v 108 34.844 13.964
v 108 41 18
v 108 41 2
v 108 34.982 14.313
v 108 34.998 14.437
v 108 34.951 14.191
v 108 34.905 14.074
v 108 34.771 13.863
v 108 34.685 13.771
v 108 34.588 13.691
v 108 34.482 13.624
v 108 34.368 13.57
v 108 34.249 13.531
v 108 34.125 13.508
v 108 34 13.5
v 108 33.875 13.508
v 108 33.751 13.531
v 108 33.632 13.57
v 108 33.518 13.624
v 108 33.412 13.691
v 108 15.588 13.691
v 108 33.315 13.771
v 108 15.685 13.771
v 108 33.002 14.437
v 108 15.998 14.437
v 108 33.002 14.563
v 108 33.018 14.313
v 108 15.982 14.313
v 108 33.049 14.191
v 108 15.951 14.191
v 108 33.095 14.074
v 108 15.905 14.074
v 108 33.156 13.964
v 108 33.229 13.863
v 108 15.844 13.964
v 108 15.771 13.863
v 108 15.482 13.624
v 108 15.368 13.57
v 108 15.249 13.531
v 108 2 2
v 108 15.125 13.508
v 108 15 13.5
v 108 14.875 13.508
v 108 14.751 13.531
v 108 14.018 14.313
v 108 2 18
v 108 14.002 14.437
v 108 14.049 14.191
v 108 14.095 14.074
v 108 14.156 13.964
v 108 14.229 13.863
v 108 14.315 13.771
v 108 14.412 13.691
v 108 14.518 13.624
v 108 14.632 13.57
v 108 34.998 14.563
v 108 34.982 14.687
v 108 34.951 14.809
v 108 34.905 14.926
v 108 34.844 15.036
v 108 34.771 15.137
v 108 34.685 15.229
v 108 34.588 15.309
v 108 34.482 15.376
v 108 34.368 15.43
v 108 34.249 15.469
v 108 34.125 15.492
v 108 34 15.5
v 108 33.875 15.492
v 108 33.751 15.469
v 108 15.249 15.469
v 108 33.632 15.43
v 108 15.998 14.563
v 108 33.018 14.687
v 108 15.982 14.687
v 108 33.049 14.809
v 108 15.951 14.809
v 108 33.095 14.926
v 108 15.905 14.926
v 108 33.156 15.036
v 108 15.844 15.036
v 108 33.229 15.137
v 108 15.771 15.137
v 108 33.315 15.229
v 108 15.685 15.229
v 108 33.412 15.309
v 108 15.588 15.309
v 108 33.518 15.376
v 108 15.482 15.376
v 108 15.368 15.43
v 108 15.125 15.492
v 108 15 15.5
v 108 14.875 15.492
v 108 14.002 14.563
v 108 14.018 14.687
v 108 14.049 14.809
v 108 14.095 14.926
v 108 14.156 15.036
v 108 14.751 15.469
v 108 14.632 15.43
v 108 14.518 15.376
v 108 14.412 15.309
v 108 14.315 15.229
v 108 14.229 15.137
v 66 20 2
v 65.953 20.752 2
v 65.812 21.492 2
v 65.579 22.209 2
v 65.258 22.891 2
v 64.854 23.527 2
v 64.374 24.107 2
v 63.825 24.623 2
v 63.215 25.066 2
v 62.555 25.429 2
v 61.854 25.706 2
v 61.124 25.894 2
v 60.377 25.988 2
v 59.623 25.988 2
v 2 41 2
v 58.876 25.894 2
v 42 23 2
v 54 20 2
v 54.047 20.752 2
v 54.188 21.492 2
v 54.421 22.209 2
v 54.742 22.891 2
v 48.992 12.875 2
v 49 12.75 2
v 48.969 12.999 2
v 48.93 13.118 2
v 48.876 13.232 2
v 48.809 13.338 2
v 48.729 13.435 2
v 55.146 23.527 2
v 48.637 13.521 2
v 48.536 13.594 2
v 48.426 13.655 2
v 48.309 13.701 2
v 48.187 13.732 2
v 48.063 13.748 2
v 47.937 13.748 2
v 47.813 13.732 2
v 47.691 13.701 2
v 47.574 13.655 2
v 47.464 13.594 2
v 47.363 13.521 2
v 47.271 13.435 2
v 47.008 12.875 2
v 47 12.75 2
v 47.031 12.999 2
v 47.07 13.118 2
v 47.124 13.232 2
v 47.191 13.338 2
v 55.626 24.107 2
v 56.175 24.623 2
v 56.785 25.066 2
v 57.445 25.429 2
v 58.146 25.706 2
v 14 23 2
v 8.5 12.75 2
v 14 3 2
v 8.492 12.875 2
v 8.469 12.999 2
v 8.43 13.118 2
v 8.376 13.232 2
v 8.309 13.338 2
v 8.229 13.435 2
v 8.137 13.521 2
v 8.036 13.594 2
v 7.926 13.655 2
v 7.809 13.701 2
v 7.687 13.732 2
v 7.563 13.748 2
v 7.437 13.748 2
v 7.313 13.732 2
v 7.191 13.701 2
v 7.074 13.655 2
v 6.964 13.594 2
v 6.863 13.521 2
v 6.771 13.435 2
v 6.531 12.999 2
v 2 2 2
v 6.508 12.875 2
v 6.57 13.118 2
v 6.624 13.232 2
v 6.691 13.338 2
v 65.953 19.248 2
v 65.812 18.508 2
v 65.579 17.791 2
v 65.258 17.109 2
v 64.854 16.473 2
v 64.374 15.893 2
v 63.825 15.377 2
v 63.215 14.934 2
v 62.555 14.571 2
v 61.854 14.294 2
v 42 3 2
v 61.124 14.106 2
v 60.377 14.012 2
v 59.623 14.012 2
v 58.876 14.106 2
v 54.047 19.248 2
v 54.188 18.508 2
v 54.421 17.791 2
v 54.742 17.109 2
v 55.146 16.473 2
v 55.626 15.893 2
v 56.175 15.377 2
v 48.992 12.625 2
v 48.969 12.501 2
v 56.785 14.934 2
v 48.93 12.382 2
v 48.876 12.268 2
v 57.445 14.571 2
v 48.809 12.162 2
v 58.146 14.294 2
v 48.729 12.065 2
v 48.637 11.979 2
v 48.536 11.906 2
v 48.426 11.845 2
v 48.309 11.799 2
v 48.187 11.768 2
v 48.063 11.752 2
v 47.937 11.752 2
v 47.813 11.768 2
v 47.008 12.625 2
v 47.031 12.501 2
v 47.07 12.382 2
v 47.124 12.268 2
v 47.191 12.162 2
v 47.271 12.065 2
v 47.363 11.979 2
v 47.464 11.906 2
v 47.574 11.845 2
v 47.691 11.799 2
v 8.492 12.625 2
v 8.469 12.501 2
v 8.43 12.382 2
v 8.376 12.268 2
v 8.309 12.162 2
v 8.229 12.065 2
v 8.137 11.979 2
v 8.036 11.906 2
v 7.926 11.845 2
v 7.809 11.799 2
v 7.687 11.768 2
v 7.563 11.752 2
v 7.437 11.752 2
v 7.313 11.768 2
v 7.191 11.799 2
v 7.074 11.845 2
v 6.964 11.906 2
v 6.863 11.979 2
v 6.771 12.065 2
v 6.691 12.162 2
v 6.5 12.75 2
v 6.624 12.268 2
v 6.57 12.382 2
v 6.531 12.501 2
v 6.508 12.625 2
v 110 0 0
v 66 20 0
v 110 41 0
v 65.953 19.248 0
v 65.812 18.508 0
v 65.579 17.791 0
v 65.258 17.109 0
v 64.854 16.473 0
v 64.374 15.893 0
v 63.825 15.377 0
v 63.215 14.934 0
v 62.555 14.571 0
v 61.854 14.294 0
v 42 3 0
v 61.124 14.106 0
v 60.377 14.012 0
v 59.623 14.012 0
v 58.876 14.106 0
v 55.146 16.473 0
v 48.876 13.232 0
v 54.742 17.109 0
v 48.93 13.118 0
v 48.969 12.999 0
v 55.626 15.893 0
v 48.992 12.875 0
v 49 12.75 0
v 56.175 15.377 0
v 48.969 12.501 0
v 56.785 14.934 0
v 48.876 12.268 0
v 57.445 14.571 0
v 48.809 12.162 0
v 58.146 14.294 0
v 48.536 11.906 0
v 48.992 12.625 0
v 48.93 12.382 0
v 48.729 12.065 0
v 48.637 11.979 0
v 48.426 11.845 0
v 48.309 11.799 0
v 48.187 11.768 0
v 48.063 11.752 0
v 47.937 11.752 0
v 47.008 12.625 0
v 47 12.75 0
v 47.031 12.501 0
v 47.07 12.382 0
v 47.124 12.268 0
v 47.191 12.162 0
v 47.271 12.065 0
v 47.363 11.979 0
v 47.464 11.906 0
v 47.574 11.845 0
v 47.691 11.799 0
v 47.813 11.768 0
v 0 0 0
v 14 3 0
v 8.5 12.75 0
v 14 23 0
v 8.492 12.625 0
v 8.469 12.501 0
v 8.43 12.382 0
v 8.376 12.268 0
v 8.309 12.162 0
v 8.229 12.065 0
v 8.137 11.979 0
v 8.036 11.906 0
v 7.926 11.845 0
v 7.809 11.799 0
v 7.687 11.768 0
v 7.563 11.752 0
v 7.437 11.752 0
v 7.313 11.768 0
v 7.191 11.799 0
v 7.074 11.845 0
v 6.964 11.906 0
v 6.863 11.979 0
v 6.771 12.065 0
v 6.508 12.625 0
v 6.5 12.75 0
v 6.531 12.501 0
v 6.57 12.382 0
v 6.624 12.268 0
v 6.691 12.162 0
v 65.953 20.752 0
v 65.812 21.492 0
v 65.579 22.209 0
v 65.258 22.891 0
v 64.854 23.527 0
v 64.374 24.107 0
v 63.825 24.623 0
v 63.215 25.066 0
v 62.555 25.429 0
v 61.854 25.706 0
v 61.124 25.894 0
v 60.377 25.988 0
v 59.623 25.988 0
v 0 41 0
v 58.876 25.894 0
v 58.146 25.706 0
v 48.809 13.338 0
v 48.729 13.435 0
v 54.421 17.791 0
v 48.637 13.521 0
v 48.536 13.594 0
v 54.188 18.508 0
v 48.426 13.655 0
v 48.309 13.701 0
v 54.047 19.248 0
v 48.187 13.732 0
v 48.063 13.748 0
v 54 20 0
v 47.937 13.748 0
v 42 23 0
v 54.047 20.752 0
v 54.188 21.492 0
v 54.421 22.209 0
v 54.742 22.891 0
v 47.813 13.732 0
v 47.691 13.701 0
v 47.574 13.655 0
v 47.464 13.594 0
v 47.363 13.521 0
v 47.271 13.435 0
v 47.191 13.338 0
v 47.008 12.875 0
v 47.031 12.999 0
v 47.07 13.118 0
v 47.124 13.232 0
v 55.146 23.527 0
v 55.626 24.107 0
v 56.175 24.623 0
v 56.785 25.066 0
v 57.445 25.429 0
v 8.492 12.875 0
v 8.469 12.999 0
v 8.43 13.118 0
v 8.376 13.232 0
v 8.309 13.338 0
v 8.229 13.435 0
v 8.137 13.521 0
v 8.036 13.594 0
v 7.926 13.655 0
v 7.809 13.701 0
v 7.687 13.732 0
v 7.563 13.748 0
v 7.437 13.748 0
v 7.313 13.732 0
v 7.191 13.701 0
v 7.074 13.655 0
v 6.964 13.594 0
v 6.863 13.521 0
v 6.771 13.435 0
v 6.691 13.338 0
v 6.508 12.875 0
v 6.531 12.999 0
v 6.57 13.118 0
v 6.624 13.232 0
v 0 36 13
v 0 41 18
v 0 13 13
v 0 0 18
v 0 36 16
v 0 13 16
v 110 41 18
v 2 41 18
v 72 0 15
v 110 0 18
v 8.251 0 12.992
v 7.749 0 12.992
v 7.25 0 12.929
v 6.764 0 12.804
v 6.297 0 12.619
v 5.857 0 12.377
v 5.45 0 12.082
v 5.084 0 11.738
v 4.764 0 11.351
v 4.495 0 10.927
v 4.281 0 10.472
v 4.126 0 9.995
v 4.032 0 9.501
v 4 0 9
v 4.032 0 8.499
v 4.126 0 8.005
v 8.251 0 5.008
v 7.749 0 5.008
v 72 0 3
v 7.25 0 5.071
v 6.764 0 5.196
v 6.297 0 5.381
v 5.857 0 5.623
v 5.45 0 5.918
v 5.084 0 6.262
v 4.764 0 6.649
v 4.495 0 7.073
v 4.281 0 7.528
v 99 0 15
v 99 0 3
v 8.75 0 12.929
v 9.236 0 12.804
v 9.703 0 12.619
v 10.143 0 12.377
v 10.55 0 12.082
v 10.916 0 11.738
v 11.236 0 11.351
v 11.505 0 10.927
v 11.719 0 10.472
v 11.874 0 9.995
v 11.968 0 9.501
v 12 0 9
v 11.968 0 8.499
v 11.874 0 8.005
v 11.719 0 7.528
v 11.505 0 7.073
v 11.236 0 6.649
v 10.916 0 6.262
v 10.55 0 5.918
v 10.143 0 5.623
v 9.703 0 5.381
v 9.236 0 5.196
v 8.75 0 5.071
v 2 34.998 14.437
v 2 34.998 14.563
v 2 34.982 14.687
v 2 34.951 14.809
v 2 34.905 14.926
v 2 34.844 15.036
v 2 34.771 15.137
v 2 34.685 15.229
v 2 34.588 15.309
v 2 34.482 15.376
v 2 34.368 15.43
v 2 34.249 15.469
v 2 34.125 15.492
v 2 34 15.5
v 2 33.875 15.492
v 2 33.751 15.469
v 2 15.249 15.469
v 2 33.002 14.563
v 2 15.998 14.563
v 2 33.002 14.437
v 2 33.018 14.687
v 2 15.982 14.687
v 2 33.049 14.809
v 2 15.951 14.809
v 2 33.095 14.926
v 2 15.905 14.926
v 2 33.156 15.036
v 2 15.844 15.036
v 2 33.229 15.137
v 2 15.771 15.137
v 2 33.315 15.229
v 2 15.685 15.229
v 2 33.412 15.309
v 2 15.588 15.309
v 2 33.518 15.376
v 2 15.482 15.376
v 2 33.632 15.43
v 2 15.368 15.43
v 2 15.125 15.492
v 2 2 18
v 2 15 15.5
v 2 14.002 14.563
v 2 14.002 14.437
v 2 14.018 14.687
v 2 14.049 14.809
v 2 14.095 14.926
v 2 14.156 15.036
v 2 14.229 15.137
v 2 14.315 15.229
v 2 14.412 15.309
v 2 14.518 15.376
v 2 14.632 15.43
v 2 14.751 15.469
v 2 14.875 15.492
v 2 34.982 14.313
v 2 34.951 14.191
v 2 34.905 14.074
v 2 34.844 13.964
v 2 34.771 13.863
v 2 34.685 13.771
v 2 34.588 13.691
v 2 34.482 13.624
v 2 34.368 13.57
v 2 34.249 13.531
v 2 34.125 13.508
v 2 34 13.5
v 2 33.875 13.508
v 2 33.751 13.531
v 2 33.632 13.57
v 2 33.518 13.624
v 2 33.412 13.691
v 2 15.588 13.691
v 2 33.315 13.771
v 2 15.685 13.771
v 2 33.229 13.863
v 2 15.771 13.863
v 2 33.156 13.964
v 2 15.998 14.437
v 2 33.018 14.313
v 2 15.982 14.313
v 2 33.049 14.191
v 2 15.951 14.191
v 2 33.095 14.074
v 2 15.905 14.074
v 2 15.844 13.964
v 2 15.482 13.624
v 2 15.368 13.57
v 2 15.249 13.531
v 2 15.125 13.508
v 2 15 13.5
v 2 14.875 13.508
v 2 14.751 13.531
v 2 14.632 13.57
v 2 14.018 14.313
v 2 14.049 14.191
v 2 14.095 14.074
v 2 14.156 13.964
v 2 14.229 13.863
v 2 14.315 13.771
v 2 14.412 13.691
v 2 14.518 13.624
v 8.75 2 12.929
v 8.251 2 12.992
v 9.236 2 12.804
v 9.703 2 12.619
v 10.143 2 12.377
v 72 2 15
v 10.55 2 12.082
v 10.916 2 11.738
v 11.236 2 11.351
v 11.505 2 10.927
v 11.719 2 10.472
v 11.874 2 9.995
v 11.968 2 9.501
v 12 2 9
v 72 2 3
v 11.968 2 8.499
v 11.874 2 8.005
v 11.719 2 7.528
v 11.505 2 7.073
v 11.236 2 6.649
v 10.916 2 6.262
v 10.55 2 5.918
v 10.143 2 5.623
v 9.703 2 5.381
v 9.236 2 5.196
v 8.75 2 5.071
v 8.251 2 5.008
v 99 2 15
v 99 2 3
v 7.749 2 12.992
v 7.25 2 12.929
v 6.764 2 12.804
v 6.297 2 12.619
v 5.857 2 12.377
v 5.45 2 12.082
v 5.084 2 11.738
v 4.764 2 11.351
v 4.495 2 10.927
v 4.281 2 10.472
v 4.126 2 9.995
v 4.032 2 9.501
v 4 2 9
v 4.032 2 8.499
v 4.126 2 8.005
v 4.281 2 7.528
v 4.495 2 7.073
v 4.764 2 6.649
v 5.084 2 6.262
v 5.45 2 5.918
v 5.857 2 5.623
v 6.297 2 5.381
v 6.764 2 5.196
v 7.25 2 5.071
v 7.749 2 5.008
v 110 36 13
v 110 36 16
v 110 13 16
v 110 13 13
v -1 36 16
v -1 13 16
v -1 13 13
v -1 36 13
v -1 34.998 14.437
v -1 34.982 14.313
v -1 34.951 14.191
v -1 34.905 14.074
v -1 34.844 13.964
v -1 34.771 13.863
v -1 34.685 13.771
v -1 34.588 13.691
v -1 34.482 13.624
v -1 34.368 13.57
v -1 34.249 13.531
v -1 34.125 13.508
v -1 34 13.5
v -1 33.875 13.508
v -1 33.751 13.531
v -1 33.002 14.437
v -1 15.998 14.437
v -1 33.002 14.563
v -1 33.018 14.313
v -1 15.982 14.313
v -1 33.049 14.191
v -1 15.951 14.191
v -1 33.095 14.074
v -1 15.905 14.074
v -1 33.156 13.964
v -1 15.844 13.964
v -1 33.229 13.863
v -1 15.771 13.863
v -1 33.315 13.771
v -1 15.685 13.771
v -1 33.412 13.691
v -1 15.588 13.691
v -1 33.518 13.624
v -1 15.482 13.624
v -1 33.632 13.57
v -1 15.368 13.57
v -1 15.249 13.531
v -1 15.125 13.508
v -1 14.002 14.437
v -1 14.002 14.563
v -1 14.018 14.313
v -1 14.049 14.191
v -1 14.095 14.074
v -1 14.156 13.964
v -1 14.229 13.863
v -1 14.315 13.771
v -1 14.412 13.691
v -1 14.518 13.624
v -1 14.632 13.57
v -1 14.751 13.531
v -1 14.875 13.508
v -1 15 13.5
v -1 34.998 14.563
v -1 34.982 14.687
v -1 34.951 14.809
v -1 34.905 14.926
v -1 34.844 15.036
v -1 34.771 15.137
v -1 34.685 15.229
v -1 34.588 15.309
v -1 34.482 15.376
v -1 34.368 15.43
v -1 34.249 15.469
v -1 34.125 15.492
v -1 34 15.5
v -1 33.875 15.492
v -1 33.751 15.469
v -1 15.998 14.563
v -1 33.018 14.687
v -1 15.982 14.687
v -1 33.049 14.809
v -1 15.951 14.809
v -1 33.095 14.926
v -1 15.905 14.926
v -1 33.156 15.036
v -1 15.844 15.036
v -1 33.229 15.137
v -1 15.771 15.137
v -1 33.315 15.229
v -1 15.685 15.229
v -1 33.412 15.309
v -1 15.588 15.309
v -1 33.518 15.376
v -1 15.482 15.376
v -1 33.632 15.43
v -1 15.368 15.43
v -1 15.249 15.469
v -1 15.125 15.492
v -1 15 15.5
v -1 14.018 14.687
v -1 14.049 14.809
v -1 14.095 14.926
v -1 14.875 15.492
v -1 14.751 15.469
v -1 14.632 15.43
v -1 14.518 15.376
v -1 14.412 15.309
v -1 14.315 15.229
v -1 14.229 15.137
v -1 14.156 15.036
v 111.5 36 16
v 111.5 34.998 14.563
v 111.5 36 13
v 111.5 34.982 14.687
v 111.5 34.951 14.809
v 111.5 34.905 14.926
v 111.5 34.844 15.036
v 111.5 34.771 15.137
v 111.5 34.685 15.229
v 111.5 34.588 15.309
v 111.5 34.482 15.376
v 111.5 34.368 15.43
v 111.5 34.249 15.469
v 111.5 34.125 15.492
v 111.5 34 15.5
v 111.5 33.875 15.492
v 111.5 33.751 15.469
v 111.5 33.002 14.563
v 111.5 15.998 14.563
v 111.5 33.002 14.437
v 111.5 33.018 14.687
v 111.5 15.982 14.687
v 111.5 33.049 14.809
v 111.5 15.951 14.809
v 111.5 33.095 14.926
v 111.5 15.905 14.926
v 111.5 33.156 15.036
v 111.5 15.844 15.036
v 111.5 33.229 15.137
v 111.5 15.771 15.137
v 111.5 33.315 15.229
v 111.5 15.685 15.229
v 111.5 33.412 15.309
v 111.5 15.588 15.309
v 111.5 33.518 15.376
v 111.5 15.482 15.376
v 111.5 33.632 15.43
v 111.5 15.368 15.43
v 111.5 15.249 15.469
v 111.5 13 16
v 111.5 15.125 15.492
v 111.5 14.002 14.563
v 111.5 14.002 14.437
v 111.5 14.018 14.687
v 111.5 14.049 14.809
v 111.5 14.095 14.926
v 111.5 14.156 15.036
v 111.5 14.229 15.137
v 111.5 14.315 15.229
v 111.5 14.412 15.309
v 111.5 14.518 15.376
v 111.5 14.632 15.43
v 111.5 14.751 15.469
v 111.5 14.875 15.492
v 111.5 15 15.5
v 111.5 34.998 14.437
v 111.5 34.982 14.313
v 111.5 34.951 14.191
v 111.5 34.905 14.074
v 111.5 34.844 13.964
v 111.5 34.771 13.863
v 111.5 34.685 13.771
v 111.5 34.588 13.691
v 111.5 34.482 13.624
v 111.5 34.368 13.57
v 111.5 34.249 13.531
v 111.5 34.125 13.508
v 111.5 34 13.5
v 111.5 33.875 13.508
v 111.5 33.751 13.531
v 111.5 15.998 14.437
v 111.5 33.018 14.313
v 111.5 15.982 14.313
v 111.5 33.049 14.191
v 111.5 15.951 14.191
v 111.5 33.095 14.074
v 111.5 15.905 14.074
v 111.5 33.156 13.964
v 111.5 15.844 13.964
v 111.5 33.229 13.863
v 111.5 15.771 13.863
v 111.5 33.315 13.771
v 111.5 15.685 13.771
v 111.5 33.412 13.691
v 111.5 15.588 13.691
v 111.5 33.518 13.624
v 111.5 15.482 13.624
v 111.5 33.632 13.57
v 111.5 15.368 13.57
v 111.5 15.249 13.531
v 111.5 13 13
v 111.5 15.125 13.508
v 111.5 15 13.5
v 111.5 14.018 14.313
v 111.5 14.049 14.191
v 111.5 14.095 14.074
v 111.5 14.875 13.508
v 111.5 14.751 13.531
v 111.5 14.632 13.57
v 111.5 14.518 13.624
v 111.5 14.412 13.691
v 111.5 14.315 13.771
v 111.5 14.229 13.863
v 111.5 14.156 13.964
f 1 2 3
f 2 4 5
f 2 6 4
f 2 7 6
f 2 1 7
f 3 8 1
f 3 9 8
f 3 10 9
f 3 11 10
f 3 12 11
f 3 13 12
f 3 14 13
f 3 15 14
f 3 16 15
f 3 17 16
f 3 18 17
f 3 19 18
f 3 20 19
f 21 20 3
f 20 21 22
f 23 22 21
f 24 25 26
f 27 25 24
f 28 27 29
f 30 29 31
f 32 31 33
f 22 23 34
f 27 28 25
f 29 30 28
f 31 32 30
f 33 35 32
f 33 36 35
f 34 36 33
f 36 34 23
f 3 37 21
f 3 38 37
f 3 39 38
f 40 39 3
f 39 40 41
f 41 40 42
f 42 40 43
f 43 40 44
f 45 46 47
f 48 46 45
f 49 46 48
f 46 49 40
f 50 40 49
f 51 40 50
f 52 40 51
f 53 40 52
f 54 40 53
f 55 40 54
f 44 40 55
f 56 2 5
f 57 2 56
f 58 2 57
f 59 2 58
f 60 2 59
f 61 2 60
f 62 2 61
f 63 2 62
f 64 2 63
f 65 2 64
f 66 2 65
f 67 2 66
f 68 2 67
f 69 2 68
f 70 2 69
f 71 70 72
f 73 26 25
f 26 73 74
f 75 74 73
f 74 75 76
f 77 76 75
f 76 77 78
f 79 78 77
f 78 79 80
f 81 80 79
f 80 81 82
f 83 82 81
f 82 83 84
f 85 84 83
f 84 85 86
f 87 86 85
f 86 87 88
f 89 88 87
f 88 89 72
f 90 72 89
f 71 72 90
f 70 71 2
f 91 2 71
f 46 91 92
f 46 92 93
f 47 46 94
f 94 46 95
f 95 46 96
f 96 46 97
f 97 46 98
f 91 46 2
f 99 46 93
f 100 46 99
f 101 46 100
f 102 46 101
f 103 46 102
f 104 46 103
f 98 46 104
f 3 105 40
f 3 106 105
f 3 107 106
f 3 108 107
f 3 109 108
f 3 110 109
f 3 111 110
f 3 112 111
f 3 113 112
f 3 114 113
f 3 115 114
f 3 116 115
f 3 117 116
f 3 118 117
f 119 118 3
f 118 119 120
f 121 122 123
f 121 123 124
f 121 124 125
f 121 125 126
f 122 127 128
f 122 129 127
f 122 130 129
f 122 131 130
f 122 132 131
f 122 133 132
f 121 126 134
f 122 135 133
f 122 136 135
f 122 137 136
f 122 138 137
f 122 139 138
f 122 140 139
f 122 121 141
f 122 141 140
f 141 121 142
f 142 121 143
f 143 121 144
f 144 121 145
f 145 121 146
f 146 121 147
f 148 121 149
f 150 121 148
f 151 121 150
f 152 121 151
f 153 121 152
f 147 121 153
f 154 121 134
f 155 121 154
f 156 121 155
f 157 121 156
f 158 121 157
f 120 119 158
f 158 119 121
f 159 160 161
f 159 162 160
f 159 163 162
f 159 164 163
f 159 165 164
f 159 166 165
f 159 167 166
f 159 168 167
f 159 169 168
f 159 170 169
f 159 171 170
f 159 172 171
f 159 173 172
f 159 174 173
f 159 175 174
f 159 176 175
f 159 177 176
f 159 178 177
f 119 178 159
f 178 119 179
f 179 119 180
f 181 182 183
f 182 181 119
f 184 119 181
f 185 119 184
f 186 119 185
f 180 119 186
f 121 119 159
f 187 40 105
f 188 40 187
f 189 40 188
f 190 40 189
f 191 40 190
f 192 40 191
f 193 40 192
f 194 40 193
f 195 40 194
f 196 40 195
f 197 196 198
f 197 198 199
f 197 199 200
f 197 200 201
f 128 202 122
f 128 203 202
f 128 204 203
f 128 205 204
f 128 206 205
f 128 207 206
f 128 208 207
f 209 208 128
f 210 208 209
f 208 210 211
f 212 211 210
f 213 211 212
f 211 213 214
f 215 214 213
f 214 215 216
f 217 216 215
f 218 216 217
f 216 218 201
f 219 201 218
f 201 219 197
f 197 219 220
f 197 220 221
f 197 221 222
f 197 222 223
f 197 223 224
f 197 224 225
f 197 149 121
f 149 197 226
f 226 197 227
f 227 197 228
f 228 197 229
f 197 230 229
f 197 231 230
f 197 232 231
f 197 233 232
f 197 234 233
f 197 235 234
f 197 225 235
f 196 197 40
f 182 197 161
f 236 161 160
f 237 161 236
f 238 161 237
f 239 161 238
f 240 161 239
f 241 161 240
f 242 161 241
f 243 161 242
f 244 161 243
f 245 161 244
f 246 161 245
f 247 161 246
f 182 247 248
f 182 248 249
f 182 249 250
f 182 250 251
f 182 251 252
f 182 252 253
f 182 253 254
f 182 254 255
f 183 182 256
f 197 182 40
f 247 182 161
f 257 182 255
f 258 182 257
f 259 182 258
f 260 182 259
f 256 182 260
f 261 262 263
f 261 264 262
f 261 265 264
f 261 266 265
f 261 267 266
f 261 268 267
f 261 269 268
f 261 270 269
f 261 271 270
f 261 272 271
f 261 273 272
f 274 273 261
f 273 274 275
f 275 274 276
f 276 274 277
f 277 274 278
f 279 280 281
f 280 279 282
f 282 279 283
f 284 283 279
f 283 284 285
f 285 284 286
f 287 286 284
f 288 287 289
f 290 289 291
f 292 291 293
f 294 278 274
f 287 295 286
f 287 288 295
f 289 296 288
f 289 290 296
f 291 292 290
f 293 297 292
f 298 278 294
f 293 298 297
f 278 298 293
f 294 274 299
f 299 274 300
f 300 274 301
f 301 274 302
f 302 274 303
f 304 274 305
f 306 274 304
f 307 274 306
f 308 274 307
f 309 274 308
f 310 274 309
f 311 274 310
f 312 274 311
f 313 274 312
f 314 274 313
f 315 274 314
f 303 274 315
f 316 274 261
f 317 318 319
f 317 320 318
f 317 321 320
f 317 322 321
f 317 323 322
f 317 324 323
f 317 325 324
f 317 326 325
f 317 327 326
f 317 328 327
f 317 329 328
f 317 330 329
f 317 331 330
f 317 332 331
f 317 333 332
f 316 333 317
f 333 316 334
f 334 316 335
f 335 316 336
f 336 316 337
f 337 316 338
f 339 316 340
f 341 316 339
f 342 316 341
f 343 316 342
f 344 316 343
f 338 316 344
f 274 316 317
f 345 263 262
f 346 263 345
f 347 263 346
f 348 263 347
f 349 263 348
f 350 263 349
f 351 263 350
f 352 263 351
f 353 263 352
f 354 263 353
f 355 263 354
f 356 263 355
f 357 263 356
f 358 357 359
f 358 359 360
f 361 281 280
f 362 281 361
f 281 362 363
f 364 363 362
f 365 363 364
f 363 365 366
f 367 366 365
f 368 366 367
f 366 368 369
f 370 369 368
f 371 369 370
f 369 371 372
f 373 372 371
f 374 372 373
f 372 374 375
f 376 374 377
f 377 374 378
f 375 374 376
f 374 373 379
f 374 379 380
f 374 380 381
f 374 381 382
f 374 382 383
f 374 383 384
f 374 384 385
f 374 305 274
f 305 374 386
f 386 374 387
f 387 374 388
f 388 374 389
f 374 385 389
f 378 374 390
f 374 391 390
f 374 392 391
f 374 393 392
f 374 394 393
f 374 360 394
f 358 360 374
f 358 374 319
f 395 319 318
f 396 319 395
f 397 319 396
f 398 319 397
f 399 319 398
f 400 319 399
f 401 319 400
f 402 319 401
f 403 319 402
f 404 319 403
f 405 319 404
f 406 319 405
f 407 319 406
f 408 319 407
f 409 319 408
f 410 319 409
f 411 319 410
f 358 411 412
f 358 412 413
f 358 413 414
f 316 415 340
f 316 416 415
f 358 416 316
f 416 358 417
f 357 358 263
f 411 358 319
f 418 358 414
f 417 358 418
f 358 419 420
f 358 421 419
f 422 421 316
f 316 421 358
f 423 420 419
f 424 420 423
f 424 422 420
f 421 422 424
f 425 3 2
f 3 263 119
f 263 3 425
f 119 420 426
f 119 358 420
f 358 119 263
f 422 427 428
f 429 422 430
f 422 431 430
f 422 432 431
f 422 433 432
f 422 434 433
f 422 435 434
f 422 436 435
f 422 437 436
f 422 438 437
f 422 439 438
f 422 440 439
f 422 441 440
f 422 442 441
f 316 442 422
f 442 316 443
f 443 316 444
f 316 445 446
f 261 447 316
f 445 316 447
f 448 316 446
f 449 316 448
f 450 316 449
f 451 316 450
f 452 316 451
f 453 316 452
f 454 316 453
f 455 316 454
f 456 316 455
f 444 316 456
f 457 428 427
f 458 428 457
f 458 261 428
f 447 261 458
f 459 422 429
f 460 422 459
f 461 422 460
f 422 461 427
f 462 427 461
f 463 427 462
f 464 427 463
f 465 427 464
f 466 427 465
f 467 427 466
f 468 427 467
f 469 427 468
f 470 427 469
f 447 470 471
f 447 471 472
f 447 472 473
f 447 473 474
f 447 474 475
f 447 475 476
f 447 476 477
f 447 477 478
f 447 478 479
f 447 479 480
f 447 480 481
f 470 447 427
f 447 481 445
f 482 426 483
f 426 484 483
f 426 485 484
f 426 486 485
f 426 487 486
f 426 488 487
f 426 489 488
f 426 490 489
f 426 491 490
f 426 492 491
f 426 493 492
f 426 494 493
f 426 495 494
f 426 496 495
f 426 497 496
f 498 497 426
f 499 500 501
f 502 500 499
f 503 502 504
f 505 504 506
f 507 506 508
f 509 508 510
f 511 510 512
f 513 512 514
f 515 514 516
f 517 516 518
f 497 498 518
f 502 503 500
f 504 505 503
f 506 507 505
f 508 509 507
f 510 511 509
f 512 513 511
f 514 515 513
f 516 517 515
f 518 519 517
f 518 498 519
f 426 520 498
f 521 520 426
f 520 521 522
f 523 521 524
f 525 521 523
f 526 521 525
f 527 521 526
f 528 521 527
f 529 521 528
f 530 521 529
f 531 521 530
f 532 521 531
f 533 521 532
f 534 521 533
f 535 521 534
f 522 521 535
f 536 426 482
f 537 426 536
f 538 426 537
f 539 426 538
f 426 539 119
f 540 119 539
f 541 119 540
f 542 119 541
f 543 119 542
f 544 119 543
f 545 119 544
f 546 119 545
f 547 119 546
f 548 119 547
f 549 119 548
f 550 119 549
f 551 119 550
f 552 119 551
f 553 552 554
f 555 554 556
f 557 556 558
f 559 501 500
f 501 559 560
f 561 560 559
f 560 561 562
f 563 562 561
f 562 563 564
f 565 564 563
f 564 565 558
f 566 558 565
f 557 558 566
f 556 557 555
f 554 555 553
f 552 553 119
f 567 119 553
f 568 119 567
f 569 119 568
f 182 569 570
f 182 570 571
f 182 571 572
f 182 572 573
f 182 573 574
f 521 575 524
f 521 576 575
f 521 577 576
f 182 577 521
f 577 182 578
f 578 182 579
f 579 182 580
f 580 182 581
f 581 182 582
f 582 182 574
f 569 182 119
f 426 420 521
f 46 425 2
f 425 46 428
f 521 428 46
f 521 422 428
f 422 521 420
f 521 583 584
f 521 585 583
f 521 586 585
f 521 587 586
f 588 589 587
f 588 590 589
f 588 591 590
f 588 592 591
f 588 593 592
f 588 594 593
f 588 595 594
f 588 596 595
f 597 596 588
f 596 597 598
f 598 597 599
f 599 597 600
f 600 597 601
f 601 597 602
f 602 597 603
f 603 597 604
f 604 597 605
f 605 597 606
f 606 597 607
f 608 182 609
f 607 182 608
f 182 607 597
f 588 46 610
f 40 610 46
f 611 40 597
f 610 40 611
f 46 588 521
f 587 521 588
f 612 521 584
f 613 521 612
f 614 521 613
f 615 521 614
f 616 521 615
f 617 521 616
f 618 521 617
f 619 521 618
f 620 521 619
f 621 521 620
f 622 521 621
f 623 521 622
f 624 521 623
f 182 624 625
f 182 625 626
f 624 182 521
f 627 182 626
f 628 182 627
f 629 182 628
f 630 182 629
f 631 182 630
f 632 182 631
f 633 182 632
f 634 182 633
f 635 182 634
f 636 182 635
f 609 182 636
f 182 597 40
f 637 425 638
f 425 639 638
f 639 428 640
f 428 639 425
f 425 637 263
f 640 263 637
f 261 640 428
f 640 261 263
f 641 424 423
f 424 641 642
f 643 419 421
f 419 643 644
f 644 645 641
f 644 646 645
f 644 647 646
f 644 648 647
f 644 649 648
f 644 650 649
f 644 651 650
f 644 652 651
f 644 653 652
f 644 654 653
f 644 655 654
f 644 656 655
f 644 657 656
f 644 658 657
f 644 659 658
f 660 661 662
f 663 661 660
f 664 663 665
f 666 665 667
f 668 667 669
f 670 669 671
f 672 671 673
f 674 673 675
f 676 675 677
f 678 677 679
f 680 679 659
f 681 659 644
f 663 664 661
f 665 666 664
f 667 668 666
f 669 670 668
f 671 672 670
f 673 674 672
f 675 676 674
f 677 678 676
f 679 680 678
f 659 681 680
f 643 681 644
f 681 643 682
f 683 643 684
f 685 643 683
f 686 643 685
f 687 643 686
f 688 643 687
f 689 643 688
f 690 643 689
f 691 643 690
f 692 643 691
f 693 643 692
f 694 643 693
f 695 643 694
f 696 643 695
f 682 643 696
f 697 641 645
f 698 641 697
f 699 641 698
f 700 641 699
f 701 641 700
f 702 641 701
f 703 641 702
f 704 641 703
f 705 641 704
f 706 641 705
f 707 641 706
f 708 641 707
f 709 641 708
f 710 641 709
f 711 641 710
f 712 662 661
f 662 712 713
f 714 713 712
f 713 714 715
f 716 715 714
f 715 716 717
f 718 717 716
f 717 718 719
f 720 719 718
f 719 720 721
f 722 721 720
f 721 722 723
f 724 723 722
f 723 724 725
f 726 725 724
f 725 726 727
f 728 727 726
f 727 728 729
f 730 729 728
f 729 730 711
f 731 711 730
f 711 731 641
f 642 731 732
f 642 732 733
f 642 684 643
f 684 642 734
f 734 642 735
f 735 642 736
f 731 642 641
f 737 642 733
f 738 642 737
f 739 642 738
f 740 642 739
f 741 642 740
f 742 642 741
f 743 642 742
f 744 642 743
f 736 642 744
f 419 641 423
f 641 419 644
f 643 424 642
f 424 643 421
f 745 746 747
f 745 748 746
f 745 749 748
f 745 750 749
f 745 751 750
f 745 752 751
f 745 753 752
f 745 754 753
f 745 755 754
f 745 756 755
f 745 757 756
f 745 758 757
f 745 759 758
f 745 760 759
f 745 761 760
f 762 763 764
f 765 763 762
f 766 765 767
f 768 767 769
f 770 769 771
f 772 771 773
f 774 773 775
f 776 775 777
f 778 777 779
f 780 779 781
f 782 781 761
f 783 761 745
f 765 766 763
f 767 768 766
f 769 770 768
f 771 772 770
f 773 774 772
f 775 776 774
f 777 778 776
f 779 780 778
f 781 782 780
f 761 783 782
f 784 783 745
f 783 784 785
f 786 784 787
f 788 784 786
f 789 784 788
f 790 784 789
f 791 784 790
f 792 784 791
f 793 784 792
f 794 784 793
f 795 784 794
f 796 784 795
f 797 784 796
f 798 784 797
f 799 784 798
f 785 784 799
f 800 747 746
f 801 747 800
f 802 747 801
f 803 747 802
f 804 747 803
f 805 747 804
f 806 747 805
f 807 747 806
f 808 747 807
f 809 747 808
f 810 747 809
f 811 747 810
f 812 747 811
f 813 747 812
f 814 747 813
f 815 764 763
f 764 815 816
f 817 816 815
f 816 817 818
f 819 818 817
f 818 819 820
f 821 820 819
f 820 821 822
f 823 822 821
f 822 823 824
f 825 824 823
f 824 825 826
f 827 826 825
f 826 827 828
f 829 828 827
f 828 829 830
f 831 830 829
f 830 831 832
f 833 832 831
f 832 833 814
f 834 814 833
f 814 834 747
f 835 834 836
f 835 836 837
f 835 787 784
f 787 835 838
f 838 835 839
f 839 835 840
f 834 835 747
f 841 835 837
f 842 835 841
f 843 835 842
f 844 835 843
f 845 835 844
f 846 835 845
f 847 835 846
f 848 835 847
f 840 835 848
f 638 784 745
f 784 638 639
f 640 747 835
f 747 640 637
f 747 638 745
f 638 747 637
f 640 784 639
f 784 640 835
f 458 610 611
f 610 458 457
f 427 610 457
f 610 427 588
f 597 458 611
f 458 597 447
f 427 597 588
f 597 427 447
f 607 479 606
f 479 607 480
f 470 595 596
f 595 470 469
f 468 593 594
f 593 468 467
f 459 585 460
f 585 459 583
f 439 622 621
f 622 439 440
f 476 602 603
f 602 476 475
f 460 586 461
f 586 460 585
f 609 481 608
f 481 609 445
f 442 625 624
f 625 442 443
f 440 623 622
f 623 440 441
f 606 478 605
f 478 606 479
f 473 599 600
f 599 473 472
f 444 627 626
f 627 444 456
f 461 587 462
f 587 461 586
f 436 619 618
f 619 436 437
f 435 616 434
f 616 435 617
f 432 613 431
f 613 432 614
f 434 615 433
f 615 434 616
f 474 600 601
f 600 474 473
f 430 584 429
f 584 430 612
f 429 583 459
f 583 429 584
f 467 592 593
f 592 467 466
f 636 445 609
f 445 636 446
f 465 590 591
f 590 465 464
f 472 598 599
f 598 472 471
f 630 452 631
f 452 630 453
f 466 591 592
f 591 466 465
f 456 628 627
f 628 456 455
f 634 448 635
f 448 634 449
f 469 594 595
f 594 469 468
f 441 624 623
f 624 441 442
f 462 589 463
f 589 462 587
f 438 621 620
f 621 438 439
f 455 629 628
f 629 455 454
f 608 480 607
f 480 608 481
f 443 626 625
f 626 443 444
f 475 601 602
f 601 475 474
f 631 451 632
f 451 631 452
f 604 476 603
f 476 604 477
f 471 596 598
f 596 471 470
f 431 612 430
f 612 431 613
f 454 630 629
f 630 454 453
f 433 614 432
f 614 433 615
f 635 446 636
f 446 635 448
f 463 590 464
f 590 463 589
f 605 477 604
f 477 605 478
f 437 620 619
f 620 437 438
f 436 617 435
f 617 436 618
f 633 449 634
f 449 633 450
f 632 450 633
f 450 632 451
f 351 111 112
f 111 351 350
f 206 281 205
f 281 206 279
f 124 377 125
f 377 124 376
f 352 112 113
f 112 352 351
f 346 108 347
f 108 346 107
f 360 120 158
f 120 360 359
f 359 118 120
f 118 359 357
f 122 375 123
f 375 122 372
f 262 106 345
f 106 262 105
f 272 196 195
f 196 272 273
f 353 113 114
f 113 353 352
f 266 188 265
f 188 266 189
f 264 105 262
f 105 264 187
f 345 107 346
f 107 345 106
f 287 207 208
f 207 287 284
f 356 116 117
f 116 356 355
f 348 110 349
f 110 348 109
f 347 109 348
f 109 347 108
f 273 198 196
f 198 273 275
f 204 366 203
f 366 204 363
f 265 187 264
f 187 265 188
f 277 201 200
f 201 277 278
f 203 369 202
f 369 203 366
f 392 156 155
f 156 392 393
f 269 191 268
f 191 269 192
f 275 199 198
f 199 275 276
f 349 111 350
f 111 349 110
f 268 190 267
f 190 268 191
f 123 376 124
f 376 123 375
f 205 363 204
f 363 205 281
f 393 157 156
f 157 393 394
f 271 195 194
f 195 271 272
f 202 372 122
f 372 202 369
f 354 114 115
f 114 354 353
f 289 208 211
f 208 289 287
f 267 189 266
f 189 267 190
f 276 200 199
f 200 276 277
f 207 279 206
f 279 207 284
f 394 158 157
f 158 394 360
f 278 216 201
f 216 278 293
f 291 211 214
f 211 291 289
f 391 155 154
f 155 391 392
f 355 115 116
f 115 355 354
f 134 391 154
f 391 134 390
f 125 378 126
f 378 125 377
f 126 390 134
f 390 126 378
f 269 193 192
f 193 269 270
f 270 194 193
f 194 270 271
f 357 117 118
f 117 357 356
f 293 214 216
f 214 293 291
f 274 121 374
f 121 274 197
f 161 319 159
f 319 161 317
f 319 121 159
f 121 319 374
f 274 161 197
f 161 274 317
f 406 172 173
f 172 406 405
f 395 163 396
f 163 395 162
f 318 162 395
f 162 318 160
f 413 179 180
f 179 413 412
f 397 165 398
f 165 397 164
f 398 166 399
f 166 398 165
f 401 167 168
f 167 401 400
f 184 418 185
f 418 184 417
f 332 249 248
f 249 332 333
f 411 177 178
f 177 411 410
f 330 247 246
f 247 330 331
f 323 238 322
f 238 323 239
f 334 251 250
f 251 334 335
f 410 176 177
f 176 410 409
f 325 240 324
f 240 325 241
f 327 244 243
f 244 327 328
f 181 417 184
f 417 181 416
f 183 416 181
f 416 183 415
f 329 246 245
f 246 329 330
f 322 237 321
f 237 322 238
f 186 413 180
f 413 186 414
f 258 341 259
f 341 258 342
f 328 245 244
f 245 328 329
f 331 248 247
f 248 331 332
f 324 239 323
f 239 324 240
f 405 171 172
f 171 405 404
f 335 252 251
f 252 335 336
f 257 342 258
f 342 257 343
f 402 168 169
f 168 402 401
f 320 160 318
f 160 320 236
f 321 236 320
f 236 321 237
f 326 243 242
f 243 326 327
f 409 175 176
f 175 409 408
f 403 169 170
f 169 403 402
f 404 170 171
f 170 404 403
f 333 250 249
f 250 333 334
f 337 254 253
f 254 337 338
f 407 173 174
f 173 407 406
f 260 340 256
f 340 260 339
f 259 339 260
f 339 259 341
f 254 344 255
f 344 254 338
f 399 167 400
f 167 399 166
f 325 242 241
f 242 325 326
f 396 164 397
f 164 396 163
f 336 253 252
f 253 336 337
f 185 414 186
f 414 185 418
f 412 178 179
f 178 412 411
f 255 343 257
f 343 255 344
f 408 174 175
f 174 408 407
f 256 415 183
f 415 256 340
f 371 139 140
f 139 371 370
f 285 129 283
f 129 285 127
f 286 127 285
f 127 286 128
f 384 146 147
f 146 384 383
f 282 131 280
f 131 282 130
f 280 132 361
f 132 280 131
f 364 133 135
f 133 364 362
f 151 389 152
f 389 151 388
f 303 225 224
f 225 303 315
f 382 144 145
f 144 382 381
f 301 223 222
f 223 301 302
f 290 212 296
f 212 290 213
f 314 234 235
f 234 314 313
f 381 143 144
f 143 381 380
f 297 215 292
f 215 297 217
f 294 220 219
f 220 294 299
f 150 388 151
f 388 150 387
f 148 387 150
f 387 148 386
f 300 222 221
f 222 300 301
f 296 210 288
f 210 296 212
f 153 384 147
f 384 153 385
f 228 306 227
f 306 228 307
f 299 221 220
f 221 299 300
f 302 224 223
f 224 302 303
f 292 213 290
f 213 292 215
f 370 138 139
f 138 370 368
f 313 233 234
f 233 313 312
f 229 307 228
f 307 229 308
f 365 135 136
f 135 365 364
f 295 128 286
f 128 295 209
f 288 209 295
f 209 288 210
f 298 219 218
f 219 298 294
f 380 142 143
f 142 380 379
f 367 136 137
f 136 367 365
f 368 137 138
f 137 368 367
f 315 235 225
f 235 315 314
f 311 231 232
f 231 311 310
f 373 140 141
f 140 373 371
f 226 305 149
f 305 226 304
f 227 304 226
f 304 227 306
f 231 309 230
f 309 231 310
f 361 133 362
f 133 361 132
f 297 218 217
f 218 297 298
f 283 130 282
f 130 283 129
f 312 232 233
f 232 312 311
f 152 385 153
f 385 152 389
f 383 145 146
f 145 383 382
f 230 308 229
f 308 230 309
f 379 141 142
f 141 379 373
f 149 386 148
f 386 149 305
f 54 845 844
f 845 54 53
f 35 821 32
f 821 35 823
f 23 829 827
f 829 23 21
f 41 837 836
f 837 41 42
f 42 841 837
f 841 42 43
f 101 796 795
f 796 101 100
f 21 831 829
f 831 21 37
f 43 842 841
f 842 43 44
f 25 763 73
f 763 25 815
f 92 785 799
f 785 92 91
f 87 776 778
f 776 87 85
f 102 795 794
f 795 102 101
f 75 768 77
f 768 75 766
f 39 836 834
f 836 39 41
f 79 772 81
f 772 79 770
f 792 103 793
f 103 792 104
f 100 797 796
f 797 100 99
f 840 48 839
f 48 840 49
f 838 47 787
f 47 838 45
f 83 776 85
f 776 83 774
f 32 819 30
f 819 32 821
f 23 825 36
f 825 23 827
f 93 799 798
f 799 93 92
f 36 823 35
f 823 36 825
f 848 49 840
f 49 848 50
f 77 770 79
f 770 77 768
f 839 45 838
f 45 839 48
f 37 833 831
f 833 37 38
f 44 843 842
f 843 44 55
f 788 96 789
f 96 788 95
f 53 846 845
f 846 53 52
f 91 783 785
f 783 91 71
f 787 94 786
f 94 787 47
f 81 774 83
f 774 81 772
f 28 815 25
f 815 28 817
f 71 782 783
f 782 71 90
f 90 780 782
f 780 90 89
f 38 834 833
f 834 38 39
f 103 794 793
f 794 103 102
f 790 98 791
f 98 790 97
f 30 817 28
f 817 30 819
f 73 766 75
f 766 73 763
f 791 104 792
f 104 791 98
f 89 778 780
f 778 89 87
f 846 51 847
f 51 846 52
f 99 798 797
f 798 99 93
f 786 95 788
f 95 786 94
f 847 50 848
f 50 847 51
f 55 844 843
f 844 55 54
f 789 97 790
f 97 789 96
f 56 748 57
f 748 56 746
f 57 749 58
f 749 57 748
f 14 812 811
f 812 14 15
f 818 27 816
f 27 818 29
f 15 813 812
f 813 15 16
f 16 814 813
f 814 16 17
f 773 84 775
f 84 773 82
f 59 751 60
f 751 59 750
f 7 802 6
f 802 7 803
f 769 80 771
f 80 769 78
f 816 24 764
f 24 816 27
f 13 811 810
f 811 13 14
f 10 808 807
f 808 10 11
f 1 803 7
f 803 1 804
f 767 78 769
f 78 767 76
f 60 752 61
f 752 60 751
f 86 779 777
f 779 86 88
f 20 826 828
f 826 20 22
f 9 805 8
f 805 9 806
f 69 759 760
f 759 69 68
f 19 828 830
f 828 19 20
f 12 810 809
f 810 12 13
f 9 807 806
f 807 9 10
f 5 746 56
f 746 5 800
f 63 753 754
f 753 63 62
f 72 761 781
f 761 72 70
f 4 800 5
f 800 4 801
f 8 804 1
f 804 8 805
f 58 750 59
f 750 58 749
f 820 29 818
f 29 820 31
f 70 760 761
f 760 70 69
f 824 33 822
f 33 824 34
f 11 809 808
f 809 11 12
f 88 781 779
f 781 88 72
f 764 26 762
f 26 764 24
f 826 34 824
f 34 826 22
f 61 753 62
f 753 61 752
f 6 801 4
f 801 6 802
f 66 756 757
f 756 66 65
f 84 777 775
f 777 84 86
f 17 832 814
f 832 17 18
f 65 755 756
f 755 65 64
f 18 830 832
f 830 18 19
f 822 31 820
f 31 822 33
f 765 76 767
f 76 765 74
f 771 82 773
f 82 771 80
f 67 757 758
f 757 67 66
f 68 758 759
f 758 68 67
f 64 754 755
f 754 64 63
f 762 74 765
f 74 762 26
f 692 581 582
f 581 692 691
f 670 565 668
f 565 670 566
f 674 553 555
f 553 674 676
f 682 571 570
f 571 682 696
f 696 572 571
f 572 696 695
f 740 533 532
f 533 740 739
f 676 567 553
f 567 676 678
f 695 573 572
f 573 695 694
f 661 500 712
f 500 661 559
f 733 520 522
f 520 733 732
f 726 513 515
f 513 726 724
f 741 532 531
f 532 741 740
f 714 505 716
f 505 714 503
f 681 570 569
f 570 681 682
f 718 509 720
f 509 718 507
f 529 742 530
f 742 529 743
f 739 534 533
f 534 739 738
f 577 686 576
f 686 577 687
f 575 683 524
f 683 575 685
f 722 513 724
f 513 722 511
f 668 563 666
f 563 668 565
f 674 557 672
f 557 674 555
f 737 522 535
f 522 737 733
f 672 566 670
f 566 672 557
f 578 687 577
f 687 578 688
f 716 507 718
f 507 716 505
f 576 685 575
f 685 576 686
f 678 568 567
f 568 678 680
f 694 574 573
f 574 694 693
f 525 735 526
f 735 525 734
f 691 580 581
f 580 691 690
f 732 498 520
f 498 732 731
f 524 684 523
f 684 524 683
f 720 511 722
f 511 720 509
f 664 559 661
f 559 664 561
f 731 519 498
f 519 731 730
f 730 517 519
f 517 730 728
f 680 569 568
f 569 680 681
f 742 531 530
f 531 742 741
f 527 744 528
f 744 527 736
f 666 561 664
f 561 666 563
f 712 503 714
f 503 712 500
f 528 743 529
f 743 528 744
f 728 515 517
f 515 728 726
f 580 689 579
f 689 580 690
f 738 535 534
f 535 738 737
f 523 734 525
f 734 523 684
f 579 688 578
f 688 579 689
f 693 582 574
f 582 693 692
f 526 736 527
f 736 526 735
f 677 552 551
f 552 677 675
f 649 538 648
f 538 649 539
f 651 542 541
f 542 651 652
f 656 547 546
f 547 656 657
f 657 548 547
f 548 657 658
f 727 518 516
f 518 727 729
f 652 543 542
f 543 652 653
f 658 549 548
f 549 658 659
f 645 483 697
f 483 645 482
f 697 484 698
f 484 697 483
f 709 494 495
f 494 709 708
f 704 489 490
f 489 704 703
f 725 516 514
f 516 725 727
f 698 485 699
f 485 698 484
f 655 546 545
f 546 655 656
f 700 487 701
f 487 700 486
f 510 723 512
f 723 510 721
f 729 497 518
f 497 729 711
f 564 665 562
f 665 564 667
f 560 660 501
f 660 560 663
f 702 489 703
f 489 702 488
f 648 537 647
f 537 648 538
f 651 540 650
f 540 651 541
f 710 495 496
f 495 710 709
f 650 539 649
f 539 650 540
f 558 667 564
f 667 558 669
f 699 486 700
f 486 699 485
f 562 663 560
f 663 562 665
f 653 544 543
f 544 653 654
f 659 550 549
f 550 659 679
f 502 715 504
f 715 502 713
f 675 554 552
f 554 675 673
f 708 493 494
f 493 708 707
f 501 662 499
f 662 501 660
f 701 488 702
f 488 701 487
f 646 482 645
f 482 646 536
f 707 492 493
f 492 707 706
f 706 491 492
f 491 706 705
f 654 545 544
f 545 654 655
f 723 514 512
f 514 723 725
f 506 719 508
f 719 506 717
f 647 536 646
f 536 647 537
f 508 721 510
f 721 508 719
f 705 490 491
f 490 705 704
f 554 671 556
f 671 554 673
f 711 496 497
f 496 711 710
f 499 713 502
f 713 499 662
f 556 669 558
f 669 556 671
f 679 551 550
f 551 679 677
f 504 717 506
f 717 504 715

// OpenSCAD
/*************************************************************************************************
Power Supply Terminal Cover for the power supply commonly used with the Bukobot and other 3d printers
Author: Mike Thompson (thingiverse: mike_linus)
Date Last Modified: 11/03/2013 4:19pm
Description: simply change the cutout parameters to suit. Note: do not change length, height, depth and thickness parameters for the base unless you want to change the core dimensions.
**************************************************************************************************/

//***************************************************************
//don't change these base parameters unless you want to change the core dimensions.
//***************************************************************
hole_resolution=50;
base_length=108;
base_height=41;
base_depth=18;
base_thickness=2;
$fn=hole_resolution;

//***************************************************************
//change these cutout parameters to suit you own switch size etc.
//***************************************************************
switch_cutout_length=27;
switch_cutout_width=12;

led_cutout_radius=4;
grommet_cutout_radius=6;

power_plug_cutout_length=28;
power_plug_cutout_width=20;

screw_hole_cutout_radius=1;

module base(){
cube([base_length,base_height,base_thickness]);
cube([base_thickness,base_height,base_depth]);
cube([base_length,base_thickness,base_depth]);
translate([base_length,0,0])cube([base_thickness,base_height,base_depth]);
translate([-1,13,13])cube([1.5,23,3]);//slot retainer
translate([base_length+base_thickness,13,13])cube([1.5,23,3]);//slot retainer
}

difference(){
base();
translate([72,0,3])cube([switch_cutout_length,base_thickness,switch_cutout_width]);  //switch cutout
translate([8,3,9])rotate([90,0,0])cylinder(r=led_cutout_radius,h=5);  //led cutout
translate([60,20,0])cylinder(r=grommet_cutout_radius,h=5);  //12v lead cutout
translate([14,3,0])cube([power_plug_cutout_length,power_plug_cutout_width,base_thickness]);  //240v plug cutout
translate([7.5,12.75,0])cylinder(r=screw_hole_cutout_radius,h=5);  //240v plug screw hole
translate([48,12.75,0])cylinder(r=screw_hole_cutout_radius,h=5);  //240v plug screw hole
translate([base_length,15,14.5])rotate([0,90,0])cylinder(r=screw_hole_cutout_radius,h=5);  //retainer screw hole
translate([base_length,34,14.5])rotate([0,90,0])cylinder(r=screw_hole_cutout_radius,h=5);  //retainer screw hole
translate([-1,15,14.5])rotate([0,90,0])cylinder(r=screw_hole_cutout_radius,h=5);  //retainer screw hole
translate([-1,34,14.5])rotate([0,90,0])cylinder(r=screw_hole_cutout_radius,h=5);  //retainer screw hole
}
